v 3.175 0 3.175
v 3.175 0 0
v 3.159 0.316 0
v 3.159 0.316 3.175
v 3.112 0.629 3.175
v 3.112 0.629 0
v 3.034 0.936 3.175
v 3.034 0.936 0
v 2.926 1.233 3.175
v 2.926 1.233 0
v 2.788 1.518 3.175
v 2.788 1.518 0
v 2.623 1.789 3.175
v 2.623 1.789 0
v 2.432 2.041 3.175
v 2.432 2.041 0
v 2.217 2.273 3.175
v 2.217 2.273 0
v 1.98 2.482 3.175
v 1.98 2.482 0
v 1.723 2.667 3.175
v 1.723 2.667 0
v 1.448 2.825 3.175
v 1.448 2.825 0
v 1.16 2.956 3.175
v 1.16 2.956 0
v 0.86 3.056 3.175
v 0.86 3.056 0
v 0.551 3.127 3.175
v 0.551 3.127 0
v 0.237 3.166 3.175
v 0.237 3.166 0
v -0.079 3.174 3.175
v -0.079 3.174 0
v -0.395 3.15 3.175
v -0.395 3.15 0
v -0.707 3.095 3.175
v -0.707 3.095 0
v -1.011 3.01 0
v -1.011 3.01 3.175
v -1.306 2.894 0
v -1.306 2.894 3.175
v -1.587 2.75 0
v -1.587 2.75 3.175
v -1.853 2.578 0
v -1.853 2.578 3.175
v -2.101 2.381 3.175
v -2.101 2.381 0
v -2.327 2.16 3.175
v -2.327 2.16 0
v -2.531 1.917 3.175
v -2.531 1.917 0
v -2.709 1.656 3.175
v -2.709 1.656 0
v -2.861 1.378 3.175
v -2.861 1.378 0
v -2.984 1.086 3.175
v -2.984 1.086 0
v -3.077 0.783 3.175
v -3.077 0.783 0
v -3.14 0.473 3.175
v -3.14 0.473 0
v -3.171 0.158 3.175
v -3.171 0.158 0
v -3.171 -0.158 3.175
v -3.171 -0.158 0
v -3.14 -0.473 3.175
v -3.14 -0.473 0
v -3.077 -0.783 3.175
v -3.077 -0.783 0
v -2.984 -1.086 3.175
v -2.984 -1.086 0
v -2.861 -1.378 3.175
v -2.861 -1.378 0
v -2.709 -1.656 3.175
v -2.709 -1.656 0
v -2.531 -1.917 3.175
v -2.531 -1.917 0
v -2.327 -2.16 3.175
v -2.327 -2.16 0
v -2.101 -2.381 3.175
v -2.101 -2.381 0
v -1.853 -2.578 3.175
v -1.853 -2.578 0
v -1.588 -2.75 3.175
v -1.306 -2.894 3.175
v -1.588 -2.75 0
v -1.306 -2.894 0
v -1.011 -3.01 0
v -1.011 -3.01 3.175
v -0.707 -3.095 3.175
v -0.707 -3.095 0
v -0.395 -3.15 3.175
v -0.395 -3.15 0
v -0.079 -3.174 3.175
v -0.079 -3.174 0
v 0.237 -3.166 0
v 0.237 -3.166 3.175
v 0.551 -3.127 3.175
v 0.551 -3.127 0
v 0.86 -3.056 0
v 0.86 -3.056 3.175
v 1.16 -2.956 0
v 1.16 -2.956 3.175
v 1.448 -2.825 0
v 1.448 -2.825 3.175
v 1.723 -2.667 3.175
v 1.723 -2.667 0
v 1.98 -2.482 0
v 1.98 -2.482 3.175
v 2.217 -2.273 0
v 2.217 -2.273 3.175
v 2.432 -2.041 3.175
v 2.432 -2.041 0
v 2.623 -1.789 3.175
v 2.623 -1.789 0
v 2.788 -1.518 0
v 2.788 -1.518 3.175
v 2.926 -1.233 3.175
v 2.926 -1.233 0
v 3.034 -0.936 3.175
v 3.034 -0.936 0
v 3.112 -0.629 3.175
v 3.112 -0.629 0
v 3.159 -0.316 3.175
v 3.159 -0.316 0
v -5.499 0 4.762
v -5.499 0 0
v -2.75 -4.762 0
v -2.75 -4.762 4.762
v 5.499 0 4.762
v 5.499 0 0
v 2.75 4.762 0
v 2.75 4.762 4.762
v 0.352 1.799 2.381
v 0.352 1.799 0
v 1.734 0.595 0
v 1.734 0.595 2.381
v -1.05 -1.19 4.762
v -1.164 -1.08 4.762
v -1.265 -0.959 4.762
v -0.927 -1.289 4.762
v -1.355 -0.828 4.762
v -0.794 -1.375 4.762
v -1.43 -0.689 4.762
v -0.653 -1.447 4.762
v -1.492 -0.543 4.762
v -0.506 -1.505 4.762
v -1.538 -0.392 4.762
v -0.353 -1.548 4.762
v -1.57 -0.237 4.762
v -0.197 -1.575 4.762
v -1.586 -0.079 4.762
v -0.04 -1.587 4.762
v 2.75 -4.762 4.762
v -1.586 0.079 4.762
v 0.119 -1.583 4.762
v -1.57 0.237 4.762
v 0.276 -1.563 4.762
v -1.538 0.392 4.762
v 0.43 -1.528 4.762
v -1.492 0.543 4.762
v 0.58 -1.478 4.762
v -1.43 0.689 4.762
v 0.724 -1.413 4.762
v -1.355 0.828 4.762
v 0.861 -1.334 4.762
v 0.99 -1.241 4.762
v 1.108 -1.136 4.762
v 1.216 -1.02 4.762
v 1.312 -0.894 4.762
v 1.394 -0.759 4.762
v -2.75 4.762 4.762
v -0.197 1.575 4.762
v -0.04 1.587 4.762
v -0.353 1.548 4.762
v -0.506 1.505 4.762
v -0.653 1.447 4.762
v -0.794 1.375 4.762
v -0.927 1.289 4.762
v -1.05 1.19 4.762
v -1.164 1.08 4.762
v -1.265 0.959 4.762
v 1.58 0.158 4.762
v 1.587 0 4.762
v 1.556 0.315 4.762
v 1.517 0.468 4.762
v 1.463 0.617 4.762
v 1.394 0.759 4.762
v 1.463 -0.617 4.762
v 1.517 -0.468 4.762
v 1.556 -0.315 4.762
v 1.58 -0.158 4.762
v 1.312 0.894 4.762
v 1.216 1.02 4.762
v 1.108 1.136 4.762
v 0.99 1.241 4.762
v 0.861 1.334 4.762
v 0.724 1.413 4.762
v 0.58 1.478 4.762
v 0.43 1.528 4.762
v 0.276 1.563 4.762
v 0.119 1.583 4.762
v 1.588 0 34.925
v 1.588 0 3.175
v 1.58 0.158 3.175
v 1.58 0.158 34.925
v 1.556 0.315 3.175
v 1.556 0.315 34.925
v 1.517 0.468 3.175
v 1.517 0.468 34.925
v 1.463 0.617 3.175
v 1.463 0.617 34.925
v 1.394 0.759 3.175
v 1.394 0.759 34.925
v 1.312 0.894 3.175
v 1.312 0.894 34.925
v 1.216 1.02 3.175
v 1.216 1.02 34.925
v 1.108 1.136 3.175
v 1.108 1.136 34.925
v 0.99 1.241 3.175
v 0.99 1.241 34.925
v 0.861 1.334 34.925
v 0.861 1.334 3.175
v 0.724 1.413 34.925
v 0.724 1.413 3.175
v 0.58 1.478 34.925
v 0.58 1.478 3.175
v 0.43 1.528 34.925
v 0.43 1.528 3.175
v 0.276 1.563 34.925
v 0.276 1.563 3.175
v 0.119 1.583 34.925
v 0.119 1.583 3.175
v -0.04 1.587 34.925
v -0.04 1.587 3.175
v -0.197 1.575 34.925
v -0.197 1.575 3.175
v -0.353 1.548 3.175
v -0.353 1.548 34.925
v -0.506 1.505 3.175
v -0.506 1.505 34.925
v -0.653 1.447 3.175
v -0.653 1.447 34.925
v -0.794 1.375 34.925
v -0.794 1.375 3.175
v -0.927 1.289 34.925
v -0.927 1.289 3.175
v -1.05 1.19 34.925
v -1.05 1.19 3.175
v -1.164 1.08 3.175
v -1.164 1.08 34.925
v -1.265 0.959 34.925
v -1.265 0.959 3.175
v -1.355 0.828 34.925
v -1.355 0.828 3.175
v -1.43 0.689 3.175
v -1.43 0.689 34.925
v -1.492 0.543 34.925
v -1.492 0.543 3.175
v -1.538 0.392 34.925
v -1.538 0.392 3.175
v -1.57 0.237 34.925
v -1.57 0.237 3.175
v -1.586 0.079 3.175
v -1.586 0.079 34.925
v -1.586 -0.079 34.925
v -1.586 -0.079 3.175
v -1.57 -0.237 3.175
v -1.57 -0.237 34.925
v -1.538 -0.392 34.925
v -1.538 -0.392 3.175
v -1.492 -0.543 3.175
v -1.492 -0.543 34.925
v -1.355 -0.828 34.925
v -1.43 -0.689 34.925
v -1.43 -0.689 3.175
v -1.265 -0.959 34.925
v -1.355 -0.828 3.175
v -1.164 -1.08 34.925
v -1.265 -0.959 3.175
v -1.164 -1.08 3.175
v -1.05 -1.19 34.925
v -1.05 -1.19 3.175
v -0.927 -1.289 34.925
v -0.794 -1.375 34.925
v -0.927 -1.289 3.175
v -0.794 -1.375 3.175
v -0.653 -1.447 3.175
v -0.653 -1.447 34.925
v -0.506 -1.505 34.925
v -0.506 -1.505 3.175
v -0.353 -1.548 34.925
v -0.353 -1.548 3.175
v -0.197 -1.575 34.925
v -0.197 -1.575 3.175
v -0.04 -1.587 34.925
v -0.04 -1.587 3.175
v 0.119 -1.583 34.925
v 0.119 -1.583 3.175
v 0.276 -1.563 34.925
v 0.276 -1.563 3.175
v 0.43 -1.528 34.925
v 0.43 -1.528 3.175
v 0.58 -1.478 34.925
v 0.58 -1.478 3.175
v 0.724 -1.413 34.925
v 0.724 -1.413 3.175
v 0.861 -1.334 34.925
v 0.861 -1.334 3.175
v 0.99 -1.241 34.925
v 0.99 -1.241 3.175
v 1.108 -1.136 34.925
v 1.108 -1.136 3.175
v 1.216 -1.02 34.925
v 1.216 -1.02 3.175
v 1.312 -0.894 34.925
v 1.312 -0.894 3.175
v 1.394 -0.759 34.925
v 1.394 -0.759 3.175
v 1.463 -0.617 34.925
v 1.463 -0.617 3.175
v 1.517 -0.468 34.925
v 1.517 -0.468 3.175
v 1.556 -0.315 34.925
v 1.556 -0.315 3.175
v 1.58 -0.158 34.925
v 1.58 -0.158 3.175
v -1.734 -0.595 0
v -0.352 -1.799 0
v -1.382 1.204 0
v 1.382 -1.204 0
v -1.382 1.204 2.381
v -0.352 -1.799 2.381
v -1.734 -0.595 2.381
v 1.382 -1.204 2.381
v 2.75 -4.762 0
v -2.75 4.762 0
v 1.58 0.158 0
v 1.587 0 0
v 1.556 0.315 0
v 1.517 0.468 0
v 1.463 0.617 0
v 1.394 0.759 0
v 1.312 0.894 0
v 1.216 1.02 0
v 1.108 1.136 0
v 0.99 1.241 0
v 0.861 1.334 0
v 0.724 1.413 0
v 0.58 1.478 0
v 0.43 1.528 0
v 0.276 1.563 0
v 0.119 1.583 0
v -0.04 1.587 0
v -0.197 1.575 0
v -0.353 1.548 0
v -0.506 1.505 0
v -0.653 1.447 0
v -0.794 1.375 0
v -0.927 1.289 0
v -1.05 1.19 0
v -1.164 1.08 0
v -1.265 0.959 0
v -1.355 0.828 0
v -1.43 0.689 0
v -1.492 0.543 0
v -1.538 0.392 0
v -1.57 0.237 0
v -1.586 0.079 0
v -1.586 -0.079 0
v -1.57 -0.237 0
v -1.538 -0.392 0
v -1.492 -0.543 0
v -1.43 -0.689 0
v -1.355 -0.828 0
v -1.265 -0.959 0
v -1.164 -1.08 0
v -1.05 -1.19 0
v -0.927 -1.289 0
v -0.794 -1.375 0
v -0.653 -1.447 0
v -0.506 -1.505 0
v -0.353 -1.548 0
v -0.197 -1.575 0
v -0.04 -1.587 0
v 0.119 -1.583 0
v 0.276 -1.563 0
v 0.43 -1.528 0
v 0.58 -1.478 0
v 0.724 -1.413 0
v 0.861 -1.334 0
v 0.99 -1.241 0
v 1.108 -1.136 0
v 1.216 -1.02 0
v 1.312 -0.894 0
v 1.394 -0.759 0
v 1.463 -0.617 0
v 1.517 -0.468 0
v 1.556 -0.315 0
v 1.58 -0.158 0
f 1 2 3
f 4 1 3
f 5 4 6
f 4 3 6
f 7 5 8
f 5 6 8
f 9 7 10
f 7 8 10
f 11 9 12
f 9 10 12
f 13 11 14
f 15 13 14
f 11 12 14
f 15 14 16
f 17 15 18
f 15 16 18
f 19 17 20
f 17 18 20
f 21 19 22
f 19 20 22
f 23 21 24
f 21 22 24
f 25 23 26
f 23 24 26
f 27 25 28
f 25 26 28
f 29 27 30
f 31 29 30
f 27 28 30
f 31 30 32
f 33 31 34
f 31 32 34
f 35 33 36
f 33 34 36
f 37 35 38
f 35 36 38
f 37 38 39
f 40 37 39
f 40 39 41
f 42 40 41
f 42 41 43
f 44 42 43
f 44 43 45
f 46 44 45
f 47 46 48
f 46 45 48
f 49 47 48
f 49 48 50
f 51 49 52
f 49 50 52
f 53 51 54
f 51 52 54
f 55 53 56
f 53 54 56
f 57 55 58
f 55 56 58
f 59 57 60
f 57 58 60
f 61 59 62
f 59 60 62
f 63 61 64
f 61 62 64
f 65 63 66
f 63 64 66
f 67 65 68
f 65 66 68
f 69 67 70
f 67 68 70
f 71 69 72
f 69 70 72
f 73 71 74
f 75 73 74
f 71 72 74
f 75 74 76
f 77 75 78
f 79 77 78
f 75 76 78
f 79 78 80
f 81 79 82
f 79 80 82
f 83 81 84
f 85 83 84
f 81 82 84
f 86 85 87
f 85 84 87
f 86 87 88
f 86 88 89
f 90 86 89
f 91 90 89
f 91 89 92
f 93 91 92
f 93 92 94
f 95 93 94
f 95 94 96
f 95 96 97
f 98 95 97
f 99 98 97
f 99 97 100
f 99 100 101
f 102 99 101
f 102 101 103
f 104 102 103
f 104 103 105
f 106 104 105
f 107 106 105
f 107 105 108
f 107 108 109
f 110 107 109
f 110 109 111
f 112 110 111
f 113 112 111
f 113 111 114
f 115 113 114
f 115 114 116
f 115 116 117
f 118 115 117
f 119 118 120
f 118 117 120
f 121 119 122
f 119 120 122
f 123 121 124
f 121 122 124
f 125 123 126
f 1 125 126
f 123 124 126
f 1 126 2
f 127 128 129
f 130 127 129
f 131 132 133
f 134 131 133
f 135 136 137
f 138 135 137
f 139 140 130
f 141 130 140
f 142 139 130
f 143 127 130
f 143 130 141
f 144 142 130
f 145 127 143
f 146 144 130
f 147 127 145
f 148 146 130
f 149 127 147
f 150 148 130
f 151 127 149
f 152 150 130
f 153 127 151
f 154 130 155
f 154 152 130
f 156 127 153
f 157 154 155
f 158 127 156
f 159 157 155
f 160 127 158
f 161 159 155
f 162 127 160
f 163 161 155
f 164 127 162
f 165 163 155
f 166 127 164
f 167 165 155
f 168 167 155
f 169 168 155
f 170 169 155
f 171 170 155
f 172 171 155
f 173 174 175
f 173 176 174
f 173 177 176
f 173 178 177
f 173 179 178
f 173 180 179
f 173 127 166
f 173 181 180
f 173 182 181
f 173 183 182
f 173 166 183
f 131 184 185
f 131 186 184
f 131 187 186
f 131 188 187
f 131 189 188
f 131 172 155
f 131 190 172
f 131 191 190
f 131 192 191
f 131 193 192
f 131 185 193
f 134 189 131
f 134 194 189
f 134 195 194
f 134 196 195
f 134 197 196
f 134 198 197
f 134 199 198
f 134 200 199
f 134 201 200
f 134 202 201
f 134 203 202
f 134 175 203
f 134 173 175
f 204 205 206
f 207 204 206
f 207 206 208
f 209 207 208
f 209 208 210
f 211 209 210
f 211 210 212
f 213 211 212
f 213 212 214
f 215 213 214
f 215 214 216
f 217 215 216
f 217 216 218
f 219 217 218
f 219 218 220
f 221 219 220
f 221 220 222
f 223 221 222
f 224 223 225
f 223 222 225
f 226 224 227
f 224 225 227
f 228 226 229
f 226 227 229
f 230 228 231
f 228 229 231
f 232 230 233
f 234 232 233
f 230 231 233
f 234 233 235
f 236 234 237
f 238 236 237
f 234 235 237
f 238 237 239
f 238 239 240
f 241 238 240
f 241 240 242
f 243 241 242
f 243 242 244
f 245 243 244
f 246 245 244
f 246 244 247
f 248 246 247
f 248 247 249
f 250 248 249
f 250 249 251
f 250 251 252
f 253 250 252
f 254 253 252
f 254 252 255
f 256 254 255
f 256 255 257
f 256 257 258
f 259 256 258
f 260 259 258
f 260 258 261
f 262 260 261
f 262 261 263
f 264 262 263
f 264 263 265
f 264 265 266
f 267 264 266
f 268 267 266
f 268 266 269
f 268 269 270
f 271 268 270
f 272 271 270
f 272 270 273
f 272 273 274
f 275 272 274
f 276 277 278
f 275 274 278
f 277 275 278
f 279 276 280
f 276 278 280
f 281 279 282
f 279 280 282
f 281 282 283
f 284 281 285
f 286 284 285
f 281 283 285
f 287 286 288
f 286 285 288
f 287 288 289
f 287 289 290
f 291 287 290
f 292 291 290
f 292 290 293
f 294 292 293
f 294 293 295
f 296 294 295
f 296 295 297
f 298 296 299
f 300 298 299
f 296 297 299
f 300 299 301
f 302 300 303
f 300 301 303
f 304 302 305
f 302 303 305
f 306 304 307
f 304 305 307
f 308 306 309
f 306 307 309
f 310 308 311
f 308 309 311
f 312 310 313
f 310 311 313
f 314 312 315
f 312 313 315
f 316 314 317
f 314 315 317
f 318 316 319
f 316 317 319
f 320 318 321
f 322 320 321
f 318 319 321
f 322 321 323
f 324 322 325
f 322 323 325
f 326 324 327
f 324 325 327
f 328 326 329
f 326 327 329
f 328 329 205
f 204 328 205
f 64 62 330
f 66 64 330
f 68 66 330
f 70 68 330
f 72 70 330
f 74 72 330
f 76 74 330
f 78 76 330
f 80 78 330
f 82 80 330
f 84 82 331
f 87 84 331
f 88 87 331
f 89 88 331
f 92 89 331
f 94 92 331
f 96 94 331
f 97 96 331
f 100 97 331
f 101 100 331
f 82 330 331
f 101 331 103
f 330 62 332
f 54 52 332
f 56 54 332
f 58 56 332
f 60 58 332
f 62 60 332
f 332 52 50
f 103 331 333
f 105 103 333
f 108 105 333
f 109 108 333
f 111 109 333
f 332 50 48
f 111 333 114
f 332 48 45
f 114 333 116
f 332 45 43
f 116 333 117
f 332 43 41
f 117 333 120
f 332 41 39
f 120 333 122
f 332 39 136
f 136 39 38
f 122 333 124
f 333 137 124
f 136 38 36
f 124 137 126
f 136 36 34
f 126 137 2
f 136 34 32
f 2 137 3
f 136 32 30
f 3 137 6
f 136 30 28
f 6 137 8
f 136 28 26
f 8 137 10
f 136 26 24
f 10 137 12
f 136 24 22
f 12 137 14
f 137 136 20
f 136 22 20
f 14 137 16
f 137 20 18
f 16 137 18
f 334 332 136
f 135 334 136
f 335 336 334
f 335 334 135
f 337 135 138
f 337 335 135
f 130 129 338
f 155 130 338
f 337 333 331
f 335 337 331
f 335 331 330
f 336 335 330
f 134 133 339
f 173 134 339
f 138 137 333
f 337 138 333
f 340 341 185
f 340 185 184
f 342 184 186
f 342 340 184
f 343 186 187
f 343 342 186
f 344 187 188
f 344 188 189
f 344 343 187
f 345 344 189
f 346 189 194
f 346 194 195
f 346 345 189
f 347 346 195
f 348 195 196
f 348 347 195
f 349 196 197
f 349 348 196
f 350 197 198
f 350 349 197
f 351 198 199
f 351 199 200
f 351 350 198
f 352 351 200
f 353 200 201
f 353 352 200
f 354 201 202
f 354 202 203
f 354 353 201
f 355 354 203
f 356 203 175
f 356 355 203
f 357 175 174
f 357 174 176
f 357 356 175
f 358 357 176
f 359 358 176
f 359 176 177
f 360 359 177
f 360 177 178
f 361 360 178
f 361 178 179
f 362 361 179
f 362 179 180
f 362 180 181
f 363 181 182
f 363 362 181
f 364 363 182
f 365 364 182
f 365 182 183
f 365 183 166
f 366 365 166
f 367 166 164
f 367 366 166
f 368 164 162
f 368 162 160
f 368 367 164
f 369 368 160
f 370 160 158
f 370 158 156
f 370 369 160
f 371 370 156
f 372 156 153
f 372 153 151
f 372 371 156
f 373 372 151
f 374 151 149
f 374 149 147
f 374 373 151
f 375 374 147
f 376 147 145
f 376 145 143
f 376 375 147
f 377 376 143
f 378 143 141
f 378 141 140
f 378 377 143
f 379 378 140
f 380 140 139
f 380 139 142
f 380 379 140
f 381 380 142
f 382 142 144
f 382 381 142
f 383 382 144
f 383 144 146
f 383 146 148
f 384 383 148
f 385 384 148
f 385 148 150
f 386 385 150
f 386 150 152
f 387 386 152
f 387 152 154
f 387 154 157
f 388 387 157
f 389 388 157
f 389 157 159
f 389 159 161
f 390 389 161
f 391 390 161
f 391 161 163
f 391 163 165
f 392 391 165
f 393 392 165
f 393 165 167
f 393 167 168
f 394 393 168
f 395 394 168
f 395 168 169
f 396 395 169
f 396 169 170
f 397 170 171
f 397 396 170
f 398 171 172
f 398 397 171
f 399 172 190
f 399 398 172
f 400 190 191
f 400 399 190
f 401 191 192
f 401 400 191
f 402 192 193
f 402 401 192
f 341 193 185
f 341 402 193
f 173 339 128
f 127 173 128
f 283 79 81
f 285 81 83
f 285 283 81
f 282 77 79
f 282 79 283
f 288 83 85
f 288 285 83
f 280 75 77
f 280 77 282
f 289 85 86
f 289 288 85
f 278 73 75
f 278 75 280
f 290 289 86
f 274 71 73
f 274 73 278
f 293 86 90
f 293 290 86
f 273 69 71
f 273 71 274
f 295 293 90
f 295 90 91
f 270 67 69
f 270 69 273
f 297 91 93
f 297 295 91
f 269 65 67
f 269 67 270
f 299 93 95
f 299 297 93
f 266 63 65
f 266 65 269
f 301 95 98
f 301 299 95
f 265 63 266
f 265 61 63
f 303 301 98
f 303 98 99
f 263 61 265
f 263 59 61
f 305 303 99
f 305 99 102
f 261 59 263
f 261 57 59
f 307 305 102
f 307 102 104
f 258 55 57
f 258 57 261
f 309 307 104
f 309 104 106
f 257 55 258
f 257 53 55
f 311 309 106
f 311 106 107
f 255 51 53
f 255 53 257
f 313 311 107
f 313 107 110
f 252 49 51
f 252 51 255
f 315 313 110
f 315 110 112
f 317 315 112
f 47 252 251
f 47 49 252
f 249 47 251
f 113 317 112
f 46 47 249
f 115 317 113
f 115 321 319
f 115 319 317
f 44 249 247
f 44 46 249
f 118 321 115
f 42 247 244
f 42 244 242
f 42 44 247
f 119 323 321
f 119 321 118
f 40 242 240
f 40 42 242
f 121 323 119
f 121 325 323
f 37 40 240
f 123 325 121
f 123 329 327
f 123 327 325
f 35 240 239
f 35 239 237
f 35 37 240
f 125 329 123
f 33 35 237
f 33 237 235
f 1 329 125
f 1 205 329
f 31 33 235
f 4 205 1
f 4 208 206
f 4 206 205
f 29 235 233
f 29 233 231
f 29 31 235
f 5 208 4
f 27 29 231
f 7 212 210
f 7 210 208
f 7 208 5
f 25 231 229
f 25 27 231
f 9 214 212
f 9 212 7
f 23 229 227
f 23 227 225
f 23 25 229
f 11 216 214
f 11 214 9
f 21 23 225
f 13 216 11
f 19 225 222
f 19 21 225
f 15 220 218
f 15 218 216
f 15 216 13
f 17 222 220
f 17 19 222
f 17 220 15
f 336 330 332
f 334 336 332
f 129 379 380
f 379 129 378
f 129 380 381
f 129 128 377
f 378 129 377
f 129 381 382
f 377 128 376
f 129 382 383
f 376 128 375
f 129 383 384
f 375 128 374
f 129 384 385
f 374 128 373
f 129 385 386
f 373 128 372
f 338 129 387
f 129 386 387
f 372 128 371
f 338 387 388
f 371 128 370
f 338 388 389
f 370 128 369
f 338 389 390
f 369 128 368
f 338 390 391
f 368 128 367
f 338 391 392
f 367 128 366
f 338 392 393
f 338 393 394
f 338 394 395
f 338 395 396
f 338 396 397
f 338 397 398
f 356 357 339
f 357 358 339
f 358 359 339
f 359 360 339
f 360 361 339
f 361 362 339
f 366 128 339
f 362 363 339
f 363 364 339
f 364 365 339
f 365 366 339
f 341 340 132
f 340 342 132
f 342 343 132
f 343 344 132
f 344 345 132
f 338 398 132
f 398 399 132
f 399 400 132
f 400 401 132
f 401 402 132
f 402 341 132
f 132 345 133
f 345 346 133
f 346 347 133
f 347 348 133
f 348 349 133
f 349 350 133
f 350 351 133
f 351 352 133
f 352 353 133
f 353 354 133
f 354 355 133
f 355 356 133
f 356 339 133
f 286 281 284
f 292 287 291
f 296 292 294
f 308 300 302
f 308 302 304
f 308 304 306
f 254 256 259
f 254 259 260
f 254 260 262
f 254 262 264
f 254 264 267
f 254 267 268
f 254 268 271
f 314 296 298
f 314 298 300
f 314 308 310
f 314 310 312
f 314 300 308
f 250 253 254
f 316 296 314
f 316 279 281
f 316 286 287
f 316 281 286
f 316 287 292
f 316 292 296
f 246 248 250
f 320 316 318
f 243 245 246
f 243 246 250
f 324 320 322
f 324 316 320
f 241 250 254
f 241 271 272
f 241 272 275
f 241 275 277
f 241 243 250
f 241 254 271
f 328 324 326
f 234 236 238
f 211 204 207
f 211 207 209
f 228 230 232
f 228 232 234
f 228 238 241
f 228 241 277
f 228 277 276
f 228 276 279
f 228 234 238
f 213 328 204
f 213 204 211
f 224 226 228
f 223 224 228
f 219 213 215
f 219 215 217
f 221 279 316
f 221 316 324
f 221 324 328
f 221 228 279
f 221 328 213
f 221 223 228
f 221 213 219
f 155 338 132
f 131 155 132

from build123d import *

# Parameters (mm, degrees)
F0_R     = 1.5875
F1_DEPTH = 4.7625
F2_DEPTH = 4.7625
F3_R     = 3.175
F4_DEPTH = 3.175
F5_R     = 1.5875
F6_DEPTH = 34.925
F8_DEPTH = 2.38125


with BuildPart() as f1:
    # F0 (on Top) → F1 (new body)
    with BuildSketch(Plane.XY):
        Polygon((2.749630657, 4.7625), (-2.749630657, 4.7625), (-5.499261314, 0), (-2.749630657, -4.7625), (2.749630657, -4.7625), (5.499261314, 0), align=None)
        Circle(F0_R, mode=Mode.SUBTRACT)
    extrude(amount=F1_DEPTH)

    # F0 (on Top) → F2 (cut)
    with BuildSketch(Plane.XY):
        Circle(F0_R)
    extrude(amount=F2_DEPTH, mode=Mode.SUBTRACT)


with BuildPart() as f4:
    # F3 (on Top) → F4 (new body)
    with BuildSketch(Plane.XY):
        Circle(F3_R)
    extrude(amount=F4_DEPTH)

    # F5 (on Top) → F6 (join)
    with BuildSketch(Plane.XY):
        Circle(F5_R)
    extrude(amount=F6_DEPTH)

    # F7 (on face) → F8 (cut)
    with BuildSketch(Plane(origin=(0, 0, 0), x_dir=(1, 0, 0), z_dir=(0, 0, -1))):
        Polygon((-0.3516971302, 1.7990323682), (-1.7338562982, 0.594937535), (-1.382159168, -1.2040948333), (0.3516971302, -1.7990323682), (1.7338562982, -0.594937535), (1.382159168, 1.2040948333), align=None)
    extrude(amount=-F8_DEPTH, mode=Mode.SUBTRACT)


solid = Compound([f1.part, f4.part])
